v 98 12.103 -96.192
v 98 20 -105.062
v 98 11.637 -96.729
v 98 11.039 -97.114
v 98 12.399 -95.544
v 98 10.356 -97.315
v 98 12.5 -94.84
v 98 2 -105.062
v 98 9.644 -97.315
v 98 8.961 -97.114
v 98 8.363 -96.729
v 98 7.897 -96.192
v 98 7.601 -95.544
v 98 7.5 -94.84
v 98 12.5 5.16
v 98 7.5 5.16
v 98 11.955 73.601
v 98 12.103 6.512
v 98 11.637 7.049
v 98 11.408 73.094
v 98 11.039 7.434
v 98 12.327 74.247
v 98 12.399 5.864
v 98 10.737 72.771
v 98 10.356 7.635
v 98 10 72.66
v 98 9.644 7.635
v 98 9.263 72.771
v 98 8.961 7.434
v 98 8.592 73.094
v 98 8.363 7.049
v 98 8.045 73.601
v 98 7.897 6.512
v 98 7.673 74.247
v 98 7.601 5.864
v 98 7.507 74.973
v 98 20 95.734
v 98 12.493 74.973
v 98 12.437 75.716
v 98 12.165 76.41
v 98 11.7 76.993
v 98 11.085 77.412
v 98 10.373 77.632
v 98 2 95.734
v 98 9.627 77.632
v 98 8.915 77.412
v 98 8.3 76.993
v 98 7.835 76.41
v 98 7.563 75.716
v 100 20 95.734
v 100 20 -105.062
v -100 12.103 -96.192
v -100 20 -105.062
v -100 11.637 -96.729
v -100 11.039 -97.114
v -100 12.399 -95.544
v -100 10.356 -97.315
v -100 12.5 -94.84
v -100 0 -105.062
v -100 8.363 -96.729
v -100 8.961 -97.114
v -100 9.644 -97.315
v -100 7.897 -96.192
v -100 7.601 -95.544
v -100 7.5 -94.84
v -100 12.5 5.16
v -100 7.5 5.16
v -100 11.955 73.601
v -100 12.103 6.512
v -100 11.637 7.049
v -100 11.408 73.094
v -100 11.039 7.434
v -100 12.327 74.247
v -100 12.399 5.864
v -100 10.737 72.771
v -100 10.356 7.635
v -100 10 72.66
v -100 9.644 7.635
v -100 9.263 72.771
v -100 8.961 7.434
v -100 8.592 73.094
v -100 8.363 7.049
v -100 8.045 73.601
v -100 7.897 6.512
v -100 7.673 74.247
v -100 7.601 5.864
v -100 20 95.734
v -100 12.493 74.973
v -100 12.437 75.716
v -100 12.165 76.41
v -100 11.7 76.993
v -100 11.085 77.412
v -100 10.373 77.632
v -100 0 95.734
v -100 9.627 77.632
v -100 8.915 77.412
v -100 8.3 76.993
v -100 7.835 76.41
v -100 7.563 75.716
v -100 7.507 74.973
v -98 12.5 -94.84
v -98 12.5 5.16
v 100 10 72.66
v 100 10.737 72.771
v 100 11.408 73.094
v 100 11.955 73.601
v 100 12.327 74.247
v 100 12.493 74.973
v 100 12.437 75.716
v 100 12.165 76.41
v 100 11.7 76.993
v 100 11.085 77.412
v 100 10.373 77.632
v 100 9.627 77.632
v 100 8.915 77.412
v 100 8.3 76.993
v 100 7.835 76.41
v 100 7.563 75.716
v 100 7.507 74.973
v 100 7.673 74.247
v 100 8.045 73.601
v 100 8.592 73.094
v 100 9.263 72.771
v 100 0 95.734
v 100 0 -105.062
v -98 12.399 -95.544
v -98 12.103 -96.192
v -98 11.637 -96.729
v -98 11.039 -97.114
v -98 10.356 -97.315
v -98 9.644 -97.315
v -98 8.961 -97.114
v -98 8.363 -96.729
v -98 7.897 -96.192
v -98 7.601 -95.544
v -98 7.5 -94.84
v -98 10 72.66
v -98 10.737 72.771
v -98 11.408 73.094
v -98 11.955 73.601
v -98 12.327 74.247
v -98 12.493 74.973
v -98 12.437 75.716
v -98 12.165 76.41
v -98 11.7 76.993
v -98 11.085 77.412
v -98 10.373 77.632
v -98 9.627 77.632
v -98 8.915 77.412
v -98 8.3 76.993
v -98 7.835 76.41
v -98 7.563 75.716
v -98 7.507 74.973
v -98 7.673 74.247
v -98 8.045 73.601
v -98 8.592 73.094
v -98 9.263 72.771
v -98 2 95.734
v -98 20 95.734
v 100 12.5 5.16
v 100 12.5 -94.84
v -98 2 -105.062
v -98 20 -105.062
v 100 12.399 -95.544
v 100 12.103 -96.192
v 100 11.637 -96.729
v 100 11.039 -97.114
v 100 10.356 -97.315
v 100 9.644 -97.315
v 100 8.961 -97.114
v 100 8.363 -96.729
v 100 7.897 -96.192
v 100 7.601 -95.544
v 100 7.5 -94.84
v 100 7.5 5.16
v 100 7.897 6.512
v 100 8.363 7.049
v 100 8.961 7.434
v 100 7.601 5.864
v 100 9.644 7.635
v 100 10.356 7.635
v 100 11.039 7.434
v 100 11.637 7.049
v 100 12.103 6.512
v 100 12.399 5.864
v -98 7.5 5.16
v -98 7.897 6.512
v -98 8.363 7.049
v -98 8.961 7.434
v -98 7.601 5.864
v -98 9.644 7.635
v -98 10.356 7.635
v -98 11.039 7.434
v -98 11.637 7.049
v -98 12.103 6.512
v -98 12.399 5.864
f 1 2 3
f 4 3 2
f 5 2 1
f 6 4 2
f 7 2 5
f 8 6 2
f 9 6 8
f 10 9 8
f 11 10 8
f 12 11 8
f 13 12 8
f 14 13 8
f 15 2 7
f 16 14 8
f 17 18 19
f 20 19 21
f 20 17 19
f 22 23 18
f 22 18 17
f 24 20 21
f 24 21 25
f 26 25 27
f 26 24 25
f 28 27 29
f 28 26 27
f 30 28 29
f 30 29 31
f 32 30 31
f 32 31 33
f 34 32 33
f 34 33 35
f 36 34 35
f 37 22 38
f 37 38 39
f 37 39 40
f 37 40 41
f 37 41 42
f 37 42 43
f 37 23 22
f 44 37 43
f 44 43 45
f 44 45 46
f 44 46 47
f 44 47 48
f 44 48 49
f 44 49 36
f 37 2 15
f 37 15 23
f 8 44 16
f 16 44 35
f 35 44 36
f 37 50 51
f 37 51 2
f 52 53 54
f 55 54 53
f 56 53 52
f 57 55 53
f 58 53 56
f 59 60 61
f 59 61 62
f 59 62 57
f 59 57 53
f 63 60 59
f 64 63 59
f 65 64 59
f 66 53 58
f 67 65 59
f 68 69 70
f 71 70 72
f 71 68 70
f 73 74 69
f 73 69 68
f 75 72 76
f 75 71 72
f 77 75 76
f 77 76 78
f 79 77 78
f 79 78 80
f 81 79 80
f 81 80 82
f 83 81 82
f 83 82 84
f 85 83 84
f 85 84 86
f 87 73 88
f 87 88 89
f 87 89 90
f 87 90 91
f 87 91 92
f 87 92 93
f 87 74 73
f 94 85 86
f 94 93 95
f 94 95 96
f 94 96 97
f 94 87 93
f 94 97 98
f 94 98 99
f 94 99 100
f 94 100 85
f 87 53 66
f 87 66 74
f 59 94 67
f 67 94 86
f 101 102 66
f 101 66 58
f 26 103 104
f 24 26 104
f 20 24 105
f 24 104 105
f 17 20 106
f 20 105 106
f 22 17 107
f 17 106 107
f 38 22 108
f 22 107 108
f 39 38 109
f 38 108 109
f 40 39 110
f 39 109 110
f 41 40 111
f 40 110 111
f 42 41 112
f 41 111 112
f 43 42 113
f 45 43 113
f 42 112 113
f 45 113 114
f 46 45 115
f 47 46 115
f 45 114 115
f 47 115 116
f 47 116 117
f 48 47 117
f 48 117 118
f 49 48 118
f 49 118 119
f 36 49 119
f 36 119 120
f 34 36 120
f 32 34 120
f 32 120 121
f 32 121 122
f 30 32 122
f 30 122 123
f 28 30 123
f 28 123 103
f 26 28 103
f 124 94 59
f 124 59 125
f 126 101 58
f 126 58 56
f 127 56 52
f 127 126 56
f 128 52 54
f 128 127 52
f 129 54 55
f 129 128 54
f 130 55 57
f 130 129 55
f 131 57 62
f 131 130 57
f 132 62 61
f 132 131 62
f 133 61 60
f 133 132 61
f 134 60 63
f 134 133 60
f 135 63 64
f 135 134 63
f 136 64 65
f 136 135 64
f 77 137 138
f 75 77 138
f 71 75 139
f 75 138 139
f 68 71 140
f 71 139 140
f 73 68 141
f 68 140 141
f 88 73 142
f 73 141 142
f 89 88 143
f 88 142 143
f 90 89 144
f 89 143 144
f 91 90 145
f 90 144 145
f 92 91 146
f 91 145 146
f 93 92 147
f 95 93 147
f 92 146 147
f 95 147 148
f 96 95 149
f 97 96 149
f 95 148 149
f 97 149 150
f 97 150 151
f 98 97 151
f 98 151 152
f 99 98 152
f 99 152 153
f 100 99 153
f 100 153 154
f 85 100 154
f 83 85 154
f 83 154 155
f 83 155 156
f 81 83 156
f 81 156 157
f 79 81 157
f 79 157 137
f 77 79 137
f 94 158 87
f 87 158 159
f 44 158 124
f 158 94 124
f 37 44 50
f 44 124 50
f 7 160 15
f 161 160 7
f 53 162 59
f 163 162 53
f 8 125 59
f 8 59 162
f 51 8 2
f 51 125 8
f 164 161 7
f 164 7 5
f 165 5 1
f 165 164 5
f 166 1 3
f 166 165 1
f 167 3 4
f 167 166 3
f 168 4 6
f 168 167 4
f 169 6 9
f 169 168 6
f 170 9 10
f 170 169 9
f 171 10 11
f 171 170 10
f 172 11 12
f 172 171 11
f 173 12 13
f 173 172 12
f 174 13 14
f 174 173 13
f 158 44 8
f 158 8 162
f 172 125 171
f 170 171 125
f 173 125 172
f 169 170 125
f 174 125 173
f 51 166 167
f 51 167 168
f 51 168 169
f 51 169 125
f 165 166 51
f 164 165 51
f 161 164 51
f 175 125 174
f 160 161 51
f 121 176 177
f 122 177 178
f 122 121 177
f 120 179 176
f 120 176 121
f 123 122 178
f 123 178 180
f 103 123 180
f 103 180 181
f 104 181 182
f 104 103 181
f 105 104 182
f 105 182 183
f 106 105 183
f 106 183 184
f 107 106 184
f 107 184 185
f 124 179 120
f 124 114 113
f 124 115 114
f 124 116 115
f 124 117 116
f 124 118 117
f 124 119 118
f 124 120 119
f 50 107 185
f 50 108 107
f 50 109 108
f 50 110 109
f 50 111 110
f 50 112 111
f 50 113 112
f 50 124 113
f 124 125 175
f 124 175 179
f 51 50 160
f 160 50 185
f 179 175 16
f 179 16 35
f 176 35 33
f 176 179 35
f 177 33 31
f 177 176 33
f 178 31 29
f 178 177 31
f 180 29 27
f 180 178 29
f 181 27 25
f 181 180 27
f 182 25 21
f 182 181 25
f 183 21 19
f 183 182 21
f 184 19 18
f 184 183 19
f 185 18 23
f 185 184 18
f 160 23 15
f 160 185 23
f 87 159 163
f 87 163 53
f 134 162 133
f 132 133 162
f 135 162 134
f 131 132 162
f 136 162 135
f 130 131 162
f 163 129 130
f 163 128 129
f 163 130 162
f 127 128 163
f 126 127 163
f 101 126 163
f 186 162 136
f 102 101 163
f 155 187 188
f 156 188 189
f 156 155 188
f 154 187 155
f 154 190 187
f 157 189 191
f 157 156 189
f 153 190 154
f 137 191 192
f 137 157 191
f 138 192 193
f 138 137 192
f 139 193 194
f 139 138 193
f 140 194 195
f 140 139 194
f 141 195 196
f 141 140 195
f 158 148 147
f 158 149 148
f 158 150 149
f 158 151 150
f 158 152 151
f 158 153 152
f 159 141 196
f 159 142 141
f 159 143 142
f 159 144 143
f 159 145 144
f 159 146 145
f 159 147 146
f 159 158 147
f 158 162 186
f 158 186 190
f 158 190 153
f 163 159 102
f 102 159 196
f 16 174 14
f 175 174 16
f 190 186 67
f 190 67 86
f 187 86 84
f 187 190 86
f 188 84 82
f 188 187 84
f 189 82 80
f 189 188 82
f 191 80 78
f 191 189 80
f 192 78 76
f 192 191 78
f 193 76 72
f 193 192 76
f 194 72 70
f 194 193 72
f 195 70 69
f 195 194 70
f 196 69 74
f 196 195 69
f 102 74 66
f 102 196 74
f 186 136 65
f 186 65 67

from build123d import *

# Parameters (mm, degrees)
BOSS_EXTRUDE1_DEPTH = 160
SKETCH2_R           = 2.5
CUT_EXTRUDE1_DEPTH  = 257.904651573
SKETCH3_W           = 54.938164949
SKETCH3_H           = 56.246543956
CUT_EXTRUDE2_DEPTH  = 257.904651573
SKETCH4_W           = 64.26610288
SKETCH4_H           = 38.441019891
CUT_EXTRUDE3_DEPTH  = 257.904651573


with BuildPart() as part:
    # Sketch1 → Boss-Extrude1 (new, symmetric)
    with BuildSketch(Plane.XY):
        Polygon((-98, 20), (-100, 20), (-100, 0), (100, 0), (100, 20), (98, 20), (98, 2), (-98, 2), align=None)
    extrude(amount=BOSS_EXTRUDE1_DEPTH, both=True)

    # Sketch2 → Cut-Extrude1 (cut, through all)
    with BuildSketch(Plane(origin=(100, 0, 0), x_dir=(0, 0, -1), z_dir=(1, 0, 0))):
        with Locations((-75.16, 10)):
            Circle(SKETCH2_R)
        with BuildLine():
            Line((-5.16, 12.5), (94.84, 12.5))
            ThreePointArc((94.84, 12.5), (97.34, 10), (94.84, 7.5))
            Line((94.84, 7.5), (-5.16, 7.5))
            ThreePointArc((-5.16, 7.5), (-7.66, 10), (-5.16, 12.5))
        make_face()
    extrude(amount=-CUT_EXTRUDE1_DEPTH, mode=Mode.SUBTRACT)

    # Sketch3 → Cut-Extrude2 (cut, through all)
    with BuildSketch(Plane(origin=(100, 0, 0), x_dir=(0, 0, -1), z_dir=(1, 0, 0))):
        with Locations((132.530917526, 28.123271978)):
            Rectangle(SKETCH3_W, SKETCH3_H)
    extrude(amount=-CUT_EXTRUDE2_DEPTH, mode=Mode.SUBTRACT)

    # Sketch4 → Cut-Extrude3 (cut, through all)
    with BuildSketch(Plane(origin=(100, 0, 0), x_dir=(0, 0, -1), z_dir=(1, 0, 0))):
        with Locations((-127.86694856, 19.220509946)):
            Rectangle(SKETCH4_W, SKETCH4_H)
    extrude(amount=-CUT_EXTRUDE3_DEPTH, mode=Mode.SUBTRACT)


solid = part.part
